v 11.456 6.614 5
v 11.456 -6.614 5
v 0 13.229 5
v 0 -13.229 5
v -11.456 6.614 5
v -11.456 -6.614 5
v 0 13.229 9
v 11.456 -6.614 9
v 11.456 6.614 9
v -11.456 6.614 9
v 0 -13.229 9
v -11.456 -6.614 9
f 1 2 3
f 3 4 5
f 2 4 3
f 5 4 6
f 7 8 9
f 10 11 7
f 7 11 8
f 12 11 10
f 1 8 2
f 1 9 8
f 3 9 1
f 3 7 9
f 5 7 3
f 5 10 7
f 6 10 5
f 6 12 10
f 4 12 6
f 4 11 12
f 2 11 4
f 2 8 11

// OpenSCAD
size = 4;

bh = 5; // board height

r = 16; // tile radius
th = 4; // tile height

edge = 2;
slack = 0.4;
depth = 2;

// --------------------------
x = 2*cos(30)*r;
y = sin(30)*r+r;
mid = 2*size-1;

// --------------------------

//miniBoard();
//board();
tile();

// --------------------------

module tile() {
    translate([0, 0, bh])
    linear_extrude(height=th)
    offset(delta=-edge-slack)
    regular_polygon(6, r);
}

module miniBoard() {
    intersection() {
        board();
        
        translate([0, 0,-bh/2])
        linear_extrude(height=2*bh)
        offset(delta=edge-e)
        regular_polygon(6, r);
    }
}

module board() {
    difference() {
        linear_extrude(height=bh)
        offset(delta=edge)
        board_2d(0);
        
        translate([0, 0, bh-depth])
        linear_extrude(height=bh)
        board_2d(os=-edge);
    }
}

module board_2d(os=0) {
    for (i = [0:size-1]) {
        dupe()
        translate([i*x/2, i*y, 0])
        line(mid-i, r, os);
    }
}

module line(n, r, os) {
    for (i = [0:n-1]) {
        translate([i*x, 0, 0])
        offset(delta=os)
        regular_polygon(6, r);
    }
}

module regular_polygon(order = 4, r=1 ){
    angles=[ for (i = [0:order-1]) i*(360/order) ];
    coords=[ for (th=angles) [r*sin(th), r*cos(th)] ];
    polygon(coords);
}

module dupe() {
    children();
    
    mirror([0,1,0])
    children();
}
